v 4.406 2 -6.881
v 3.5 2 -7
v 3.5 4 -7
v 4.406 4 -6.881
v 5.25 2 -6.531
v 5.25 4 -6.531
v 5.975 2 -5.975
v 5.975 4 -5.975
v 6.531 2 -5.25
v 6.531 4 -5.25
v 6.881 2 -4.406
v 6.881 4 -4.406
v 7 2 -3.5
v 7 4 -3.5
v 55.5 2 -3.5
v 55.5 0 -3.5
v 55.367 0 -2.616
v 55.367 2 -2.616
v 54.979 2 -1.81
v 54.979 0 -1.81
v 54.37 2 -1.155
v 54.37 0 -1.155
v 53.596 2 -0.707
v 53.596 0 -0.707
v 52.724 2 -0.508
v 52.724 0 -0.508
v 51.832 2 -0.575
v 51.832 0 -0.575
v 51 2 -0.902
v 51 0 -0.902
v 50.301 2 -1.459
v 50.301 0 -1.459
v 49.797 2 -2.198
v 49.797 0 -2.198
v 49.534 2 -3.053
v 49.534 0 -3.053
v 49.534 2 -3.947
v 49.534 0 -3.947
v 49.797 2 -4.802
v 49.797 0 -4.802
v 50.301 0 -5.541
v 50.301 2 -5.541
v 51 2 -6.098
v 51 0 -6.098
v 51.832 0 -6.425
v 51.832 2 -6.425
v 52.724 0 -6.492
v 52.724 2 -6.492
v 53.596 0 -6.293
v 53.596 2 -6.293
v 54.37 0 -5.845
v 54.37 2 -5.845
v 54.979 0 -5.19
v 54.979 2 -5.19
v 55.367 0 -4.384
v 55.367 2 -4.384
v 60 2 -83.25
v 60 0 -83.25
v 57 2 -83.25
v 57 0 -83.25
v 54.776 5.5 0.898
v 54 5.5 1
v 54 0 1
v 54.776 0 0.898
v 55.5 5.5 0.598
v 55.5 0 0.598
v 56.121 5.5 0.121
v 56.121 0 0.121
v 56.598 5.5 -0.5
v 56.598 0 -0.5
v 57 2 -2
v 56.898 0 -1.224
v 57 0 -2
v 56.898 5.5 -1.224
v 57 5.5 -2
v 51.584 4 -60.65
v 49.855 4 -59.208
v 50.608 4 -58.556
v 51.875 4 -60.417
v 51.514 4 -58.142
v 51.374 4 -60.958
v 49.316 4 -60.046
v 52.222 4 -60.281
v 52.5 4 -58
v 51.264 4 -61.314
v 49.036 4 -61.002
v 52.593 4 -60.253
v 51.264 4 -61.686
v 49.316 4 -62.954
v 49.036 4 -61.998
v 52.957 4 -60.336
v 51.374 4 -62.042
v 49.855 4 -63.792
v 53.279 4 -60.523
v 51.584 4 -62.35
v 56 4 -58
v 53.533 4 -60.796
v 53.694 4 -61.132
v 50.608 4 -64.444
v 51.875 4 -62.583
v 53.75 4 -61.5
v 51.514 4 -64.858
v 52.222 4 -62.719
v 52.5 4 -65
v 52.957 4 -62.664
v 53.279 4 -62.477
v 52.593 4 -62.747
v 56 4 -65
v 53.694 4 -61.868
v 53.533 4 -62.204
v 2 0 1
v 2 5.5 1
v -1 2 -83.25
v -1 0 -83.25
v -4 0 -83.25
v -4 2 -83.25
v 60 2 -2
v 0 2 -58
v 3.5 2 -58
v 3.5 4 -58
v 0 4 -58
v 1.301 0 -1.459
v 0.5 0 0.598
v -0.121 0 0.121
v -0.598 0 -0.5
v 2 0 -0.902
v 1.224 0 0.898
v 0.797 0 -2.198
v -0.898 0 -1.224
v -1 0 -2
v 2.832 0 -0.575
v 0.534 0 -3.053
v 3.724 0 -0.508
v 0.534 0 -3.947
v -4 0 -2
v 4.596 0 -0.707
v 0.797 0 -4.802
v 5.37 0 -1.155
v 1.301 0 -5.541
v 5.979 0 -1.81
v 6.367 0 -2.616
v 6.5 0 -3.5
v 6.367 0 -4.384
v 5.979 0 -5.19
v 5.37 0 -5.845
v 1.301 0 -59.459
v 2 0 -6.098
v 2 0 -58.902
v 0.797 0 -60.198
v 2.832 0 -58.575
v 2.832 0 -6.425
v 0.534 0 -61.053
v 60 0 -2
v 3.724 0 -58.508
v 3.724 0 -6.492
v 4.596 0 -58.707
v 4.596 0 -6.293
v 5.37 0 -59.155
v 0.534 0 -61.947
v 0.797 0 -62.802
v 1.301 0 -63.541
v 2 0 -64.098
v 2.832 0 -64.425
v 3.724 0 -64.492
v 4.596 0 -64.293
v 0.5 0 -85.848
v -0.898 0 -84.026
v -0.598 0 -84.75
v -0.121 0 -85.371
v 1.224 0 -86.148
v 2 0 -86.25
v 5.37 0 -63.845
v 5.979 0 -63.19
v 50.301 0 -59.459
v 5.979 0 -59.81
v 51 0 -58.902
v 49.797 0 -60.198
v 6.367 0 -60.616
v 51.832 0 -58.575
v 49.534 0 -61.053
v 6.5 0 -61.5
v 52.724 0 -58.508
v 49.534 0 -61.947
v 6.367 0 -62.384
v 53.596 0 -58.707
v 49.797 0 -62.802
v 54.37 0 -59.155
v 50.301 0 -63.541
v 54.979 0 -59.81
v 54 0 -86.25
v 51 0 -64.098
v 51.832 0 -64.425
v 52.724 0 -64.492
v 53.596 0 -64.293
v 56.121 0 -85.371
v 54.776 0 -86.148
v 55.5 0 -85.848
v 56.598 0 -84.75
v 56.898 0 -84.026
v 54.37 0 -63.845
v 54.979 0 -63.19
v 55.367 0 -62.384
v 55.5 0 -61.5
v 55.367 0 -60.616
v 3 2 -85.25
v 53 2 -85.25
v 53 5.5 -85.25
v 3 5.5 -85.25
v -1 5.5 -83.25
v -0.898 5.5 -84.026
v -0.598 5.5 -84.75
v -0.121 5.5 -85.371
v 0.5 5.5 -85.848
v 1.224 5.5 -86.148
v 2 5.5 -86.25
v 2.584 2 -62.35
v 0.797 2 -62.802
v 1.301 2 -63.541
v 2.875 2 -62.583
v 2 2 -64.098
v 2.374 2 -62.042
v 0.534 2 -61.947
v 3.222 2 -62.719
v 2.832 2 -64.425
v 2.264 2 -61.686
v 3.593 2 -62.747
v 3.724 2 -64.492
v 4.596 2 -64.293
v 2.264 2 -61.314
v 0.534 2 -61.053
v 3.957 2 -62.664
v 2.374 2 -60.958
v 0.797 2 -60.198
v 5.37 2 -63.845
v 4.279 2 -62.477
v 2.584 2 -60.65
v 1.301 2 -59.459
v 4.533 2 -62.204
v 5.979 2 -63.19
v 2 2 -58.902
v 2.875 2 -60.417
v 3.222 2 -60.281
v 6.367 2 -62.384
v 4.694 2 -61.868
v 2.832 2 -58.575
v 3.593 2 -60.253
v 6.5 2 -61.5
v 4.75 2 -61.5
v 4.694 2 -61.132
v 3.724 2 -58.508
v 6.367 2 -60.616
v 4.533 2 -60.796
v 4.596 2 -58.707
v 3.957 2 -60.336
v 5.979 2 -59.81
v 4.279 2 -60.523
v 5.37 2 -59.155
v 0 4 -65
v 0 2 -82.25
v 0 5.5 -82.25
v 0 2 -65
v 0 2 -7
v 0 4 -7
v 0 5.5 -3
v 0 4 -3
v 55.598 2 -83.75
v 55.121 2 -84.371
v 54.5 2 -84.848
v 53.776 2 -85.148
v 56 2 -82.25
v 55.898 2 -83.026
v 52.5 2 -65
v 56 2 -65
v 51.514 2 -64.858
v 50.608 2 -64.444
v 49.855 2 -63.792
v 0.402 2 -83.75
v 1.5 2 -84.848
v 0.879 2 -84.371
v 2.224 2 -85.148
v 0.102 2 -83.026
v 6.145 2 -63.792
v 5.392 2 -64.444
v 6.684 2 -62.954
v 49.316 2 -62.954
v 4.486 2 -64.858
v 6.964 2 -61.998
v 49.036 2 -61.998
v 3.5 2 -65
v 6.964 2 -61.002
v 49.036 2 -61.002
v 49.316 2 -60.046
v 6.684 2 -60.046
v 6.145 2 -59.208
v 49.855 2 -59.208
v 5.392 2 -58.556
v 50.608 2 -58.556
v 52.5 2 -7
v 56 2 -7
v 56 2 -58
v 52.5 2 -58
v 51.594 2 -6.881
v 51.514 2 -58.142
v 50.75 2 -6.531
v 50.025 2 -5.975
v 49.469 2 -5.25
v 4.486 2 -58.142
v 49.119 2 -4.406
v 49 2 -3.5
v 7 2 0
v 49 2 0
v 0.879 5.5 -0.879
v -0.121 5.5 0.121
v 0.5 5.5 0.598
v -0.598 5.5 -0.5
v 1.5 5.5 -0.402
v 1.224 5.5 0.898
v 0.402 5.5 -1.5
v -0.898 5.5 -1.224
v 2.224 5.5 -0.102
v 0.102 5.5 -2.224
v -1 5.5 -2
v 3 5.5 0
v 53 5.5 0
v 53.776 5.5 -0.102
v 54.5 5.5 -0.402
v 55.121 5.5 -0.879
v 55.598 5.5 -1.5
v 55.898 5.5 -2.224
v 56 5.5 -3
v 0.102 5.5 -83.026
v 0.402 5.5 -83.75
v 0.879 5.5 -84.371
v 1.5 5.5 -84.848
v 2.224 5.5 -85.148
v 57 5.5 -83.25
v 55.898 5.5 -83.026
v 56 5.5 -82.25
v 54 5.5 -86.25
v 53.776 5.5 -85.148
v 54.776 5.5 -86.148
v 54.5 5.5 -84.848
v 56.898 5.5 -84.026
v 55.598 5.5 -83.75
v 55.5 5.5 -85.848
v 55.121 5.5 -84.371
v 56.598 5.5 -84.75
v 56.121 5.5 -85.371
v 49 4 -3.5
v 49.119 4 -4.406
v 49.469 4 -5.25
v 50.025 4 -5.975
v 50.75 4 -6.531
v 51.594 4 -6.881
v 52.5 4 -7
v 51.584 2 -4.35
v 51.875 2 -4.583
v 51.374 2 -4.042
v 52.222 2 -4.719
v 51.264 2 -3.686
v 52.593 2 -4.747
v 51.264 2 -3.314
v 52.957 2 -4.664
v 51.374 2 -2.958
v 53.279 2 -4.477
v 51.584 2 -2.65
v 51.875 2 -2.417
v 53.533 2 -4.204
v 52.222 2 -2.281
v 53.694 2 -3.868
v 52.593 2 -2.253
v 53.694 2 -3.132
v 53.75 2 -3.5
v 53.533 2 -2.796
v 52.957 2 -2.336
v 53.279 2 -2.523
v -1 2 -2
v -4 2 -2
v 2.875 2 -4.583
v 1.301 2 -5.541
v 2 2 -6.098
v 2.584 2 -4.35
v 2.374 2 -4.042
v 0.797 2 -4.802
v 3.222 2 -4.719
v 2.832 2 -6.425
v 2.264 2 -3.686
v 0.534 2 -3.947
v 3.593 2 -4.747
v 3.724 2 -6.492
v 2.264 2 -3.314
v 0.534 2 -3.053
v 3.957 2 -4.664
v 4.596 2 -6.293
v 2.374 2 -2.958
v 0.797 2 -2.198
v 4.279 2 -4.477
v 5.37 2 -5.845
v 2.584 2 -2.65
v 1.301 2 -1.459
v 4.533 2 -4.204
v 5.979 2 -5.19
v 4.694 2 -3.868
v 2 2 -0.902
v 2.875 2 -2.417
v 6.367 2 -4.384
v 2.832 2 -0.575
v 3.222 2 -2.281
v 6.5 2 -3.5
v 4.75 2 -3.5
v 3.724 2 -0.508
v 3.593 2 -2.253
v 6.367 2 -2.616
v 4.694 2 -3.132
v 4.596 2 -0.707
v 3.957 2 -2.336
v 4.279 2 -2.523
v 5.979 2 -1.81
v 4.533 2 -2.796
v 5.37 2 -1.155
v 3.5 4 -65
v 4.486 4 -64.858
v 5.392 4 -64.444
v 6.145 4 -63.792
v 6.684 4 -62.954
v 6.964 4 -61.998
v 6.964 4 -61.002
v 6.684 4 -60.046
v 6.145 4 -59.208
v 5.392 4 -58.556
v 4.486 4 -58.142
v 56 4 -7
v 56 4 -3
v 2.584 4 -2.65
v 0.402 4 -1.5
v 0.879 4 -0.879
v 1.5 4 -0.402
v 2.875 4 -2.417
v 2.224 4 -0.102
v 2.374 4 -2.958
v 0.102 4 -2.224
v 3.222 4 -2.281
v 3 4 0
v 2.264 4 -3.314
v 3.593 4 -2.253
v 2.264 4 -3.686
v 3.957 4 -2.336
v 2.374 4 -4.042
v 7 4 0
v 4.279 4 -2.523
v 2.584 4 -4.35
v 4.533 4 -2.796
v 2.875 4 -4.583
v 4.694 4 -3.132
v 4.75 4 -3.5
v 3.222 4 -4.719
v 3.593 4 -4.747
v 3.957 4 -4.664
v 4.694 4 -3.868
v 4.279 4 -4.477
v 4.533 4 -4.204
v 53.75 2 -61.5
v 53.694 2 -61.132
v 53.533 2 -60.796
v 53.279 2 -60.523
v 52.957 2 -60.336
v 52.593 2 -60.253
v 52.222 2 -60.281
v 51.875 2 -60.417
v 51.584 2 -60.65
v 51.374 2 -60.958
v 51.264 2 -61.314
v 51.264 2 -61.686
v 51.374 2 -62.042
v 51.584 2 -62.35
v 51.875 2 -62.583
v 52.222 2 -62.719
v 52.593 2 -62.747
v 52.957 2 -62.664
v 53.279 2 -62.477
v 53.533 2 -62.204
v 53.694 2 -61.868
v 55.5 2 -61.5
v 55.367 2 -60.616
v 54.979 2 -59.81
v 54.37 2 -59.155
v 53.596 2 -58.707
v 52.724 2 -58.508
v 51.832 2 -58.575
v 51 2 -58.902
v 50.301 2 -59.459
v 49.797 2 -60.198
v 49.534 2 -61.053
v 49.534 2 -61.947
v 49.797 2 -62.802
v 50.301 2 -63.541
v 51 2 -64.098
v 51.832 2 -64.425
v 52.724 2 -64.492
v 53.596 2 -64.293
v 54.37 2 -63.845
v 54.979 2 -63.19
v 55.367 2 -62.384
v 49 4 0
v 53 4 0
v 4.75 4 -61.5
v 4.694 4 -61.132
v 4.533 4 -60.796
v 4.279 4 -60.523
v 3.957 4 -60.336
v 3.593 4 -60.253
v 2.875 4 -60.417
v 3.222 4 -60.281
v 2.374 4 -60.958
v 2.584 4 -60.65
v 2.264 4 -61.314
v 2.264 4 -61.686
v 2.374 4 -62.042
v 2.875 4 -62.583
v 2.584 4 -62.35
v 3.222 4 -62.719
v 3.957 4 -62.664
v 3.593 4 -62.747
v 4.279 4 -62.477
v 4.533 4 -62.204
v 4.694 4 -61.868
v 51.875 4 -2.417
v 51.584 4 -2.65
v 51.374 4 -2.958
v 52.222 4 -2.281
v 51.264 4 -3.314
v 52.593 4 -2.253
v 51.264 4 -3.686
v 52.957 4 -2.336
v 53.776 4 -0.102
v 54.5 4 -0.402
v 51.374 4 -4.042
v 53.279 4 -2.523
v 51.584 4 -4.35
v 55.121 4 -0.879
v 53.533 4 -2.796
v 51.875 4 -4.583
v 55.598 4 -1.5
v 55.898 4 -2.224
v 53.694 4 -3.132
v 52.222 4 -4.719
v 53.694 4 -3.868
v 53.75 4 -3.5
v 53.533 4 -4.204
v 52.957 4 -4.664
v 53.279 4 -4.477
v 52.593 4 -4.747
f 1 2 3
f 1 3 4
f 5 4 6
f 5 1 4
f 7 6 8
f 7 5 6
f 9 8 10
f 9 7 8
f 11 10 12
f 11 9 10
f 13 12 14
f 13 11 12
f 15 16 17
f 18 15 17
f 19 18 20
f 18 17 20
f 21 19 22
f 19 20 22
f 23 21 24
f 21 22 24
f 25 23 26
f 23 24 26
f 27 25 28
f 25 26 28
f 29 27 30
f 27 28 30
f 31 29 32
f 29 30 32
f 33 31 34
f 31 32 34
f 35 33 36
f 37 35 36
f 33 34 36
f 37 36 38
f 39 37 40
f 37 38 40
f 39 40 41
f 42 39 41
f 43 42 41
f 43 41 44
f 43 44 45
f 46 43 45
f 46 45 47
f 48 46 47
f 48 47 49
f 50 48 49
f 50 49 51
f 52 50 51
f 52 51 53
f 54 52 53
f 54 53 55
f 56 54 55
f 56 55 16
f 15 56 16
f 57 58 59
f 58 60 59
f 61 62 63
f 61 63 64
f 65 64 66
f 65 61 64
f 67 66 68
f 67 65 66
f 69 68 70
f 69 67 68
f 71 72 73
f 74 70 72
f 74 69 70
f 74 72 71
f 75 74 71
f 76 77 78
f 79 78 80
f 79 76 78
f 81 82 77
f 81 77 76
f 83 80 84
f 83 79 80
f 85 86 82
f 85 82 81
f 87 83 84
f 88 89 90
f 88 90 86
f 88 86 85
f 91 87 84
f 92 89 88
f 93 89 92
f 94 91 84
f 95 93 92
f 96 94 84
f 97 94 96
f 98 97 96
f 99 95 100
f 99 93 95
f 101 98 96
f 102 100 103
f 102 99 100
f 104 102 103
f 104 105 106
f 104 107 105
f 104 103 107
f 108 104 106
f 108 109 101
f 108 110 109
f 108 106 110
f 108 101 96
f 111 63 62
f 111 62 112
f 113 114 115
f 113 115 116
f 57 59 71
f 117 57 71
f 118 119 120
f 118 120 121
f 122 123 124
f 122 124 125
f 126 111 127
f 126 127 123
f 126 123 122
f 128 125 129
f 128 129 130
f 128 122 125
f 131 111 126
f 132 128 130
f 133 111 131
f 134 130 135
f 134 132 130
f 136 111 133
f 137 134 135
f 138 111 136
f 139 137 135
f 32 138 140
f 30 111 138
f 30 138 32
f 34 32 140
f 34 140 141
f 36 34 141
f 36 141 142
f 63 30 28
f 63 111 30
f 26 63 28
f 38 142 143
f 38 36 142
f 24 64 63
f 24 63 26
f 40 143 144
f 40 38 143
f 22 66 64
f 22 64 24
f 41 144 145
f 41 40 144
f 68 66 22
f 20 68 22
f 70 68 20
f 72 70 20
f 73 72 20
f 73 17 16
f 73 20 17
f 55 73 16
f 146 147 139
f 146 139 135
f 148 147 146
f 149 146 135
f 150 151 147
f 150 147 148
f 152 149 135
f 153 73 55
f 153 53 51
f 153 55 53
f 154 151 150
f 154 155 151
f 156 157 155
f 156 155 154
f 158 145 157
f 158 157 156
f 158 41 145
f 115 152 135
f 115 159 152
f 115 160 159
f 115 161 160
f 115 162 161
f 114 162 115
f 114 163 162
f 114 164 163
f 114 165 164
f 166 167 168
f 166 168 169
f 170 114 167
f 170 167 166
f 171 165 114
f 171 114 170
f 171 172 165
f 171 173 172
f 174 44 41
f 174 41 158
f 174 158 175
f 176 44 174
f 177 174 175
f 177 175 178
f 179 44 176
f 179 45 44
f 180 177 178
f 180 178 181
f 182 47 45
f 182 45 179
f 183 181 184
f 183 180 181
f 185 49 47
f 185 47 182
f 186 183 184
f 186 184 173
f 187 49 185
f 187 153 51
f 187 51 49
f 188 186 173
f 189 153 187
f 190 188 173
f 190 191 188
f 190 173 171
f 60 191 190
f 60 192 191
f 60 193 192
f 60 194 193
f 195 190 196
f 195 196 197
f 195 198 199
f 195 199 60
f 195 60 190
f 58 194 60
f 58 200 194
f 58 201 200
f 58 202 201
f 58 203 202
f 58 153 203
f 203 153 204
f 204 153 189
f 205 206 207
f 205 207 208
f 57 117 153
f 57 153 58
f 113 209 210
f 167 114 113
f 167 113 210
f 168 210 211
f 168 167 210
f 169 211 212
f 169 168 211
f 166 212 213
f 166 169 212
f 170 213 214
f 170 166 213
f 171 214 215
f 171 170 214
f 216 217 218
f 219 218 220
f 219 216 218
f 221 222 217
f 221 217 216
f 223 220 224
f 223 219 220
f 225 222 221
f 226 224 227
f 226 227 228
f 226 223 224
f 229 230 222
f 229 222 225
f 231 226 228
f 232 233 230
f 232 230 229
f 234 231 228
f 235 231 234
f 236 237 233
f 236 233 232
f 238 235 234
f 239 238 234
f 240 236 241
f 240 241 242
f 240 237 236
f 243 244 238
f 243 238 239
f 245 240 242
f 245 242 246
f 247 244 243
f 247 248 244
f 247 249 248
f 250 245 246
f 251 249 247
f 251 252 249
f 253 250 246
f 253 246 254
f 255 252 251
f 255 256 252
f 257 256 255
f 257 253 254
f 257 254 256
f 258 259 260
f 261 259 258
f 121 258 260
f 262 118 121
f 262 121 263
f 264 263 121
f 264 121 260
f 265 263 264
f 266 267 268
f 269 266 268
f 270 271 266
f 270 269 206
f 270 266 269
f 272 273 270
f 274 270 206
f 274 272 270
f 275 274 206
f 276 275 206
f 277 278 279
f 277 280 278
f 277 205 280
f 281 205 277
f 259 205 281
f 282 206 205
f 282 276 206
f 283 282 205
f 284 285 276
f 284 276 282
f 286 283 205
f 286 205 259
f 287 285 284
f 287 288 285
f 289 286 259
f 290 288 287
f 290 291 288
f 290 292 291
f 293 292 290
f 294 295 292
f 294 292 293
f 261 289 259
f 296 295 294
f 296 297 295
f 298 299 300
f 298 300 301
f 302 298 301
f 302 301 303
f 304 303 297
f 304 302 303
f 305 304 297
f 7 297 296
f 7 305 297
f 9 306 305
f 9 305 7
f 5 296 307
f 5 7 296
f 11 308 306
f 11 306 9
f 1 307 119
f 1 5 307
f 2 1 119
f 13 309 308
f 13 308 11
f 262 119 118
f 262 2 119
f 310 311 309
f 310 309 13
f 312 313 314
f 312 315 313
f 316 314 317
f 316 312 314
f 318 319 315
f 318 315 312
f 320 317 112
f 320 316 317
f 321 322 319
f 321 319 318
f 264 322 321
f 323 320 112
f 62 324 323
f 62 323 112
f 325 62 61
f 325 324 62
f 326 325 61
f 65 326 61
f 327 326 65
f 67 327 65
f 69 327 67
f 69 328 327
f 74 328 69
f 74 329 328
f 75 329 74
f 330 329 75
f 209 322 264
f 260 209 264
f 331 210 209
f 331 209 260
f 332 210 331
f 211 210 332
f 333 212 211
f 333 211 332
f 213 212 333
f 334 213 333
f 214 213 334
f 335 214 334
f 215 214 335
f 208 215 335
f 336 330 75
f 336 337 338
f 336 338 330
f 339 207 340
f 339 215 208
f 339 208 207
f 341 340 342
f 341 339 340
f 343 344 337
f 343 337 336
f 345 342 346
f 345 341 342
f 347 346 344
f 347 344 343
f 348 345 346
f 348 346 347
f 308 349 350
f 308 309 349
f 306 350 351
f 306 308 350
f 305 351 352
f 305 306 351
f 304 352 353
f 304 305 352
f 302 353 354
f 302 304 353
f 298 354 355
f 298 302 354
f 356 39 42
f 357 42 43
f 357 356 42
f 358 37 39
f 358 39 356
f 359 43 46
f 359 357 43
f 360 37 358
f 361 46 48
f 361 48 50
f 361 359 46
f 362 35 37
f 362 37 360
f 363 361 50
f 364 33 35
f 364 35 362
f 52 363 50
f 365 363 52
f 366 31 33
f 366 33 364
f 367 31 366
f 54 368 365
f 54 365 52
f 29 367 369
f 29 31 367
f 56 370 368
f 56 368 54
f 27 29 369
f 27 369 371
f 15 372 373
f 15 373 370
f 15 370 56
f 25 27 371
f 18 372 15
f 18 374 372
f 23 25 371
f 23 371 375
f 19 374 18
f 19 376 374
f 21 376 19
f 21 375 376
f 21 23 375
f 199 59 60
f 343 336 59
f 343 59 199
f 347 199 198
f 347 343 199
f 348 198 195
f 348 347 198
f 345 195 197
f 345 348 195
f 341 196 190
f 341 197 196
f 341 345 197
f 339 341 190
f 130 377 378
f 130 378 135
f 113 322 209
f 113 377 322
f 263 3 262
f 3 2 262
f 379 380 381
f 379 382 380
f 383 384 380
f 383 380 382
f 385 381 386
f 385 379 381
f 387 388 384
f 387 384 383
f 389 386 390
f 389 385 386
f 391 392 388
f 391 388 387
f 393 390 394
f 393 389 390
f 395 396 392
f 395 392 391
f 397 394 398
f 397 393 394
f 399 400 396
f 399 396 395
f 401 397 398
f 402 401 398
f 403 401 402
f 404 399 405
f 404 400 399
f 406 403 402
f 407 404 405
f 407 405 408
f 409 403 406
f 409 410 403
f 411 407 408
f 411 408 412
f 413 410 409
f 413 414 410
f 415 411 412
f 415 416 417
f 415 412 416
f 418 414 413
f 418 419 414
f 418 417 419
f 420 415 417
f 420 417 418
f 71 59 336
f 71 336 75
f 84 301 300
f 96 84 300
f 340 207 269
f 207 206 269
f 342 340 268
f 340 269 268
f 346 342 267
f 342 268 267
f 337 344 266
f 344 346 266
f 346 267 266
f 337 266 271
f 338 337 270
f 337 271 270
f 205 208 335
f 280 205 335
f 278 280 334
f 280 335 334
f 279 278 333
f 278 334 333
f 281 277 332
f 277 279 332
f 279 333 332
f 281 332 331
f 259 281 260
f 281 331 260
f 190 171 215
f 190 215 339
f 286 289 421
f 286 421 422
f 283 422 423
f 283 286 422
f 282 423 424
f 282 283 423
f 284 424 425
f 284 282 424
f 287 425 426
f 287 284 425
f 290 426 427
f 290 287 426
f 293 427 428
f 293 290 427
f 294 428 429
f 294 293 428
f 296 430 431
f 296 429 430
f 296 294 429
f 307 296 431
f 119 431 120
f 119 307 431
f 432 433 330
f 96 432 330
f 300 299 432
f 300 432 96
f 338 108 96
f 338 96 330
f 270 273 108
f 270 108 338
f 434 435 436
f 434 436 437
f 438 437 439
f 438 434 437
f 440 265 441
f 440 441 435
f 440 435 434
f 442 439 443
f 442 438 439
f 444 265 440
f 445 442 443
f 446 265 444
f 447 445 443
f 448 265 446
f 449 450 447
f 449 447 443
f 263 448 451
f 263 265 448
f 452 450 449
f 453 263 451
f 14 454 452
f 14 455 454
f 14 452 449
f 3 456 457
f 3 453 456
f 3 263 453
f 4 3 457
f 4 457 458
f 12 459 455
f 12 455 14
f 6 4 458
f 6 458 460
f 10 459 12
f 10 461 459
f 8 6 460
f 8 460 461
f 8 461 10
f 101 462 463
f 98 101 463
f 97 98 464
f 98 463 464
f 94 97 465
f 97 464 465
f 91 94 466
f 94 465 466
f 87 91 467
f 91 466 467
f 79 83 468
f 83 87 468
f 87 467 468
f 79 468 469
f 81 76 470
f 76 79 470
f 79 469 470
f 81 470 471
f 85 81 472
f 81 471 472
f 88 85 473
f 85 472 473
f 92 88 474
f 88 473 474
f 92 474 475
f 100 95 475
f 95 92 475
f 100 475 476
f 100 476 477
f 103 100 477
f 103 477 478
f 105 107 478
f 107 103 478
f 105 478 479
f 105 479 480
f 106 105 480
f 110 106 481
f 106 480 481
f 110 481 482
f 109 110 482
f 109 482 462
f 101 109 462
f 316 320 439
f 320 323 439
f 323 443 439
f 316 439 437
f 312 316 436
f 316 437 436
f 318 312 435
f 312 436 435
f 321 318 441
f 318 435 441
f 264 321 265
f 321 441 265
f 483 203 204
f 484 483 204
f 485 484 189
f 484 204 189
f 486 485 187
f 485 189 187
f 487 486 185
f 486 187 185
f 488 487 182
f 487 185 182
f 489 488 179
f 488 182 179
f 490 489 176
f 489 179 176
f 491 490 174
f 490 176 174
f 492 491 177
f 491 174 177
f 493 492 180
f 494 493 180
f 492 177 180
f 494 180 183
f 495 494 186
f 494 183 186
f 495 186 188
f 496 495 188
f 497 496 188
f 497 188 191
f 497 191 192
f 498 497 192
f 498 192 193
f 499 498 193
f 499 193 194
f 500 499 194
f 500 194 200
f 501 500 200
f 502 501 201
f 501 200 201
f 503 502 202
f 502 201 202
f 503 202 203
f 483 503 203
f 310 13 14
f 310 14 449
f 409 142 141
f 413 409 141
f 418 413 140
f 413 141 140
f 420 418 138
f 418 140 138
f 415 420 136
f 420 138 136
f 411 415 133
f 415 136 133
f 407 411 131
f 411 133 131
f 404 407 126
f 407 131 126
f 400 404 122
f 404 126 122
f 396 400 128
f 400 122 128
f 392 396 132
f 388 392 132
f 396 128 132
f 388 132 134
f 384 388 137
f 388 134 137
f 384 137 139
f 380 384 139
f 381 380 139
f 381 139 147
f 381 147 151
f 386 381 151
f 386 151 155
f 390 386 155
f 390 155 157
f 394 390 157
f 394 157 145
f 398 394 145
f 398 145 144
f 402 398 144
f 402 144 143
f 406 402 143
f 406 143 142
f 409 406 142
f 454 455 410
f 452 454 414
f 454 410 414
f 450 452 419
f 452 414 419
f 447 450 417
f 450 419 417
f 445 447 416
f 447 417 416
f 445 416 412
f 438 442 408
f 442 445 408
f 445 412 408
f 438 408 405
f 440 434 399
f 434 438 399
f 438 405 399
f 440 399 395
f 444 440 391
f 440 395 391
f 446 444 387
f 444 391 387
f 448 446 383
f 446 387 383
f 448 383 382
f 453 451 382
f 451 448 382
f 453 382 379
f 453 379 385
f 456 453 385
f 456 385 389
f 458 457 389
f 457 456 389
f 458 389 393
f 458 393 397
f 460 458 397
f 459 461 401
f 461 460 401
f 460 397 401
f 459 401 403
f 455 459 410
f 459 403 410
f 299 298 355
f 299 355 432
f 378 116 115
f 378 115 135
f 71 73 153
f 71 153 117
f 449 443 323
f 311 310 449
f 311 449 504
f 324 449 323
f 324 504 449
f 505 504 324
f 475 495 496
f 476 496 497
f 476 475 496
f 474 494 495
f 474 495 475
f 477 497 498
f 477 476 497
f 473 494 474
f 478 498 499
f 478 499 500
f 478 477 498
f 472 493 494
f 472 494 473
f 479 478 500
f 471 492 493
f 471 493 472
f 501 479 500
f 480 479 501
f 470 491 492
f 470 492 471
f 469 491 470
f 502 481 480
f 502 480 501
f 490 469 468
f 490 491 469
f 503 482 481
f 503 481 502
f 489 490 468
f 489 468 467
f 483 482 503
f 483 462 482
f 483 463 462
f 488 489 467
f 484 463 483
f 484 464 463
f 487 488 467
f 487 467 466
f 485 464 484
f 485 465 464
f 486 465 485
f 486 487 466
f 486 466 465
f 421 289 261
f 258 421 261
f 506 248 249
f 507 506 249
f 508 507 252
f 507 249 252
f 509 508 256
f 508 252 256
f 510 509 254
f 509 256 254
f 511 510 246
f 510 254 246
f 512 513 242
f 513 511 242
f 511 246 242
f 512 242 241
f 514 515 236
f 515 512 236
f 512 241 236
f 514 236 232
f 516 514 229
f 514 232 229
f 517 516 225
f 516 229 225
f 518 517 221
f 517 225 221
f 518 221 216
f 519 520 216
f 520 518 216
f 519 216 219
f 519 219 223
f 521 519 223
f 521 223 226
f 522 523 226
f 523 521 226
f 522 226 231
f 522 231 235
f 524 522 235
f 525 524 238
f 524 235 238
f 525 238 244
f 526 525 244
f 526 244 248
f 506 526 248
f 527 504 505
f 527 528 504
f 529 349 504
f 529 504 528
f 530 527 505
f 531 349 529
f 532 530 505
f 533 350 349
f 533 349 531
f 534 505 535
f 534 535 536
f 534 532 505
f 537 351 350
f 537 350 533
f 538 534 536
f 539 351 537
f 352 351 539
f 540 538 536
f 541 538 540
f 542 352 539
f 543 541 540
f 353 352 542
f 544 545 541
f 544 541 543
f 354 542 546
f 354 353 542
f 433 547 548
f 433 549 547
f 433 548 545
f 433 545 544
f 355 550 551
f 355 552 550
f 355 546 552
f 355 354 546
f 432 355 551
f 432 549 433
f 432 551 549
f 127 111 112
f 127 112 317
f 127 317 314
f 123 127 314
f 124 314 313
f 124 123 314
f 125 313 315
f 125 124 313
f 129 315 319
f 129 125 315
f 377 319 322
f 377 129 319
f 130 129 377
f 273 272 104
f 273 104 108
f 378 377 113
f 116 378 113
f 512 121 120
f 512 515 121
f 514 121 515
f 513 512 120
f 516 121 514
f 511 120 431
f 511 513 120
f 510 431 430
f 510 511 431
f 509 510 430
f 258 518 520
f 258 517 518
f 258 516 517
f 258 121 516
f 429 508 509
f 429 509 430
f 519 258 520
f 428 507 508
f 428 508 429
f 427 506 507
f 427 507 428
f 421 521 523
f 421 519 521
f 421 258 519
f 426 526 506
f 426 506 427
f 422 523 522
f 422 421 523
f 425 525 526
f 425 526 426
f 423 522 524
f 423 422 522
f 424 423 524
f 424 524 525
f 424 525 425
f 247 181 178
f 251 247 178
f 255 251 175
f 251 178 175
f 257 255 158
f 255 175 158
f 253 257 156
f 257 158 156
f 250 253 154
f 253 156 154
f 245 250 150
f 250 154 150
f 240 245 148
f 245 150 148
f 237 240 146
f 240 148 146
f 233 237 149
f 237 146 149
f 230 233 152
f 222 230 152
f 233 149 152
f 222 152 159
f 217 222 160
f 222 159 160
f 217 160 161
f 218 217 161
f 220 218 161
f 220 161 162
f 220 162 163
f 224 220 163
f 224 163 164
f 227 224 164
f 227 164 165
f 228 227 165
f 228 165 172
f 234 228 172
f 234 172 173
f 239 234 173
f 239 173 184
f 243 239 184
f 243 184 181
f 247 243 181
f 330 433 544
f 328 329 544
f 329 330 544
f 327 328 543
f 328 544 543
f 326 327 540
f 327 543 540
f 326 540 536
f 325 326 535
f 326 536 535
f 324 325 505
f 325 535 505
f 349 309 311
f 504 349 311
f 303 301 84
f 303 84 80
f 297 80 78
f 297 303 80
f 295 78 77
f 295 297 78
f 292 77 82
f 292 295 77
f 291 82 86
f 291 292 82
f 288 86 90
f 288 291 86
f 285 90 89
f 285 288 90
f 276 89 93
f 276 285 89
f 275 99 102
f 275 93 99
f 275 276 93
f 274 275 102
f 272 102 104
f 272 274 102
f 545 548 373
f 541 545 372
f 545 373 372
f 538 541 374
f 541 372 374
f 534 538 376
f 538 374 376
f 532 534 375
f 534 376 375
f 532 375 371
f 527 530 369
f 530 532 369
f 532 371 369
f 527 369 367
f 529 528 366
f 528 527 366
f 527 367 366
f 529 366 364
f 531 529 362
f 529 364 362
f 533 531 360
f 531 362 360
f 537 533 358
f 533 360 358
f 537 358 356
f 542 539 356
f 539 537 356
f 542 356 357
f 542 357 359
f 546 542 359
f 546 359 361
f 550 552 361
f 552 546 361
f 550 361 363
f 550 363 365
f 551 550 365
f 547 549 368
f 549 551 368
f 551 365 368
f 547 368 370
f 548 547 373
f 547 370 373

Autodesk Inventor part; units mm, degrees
ref_plane "YZ Plane" through (0, 0, 0) normal (1, 0, 0) x (0, 1, 0)
ref_plane "XZ Plane" through (0, 0, 0) normal (0, 1, 0) x (-1, 0, 0)
ref_plane "XY Plane" through (0, 0, 0) normal (0, 0, 1) x (1, 0, 0)
sketch "Sketch1" plane through (0, 0, 0) normal (0, 1, 0) x (-1, 0, 0)
  line L0 (0, 0) -> (-56, 0)
  line L1 (-56, 0) -> (-56, -85.25)
  line L2 (-56, -85.25) -> (0, -85.25)
  line L3 (0, -85.25) -> (0, 0)
  dimension "d0" = 56
  dimension "d1" = 85.25
extrude "Extrusion1" add sketch "Sketch1" along normal blind 2
sketch "Sketch2" plane through (0, 2, 0) normal (0, 1, 0) x (1, 0, 0)
  line L0 (0, 85.25) -> (0, 0) projected
  line L1 (0, 0) -> (56, 0) projected
  line L2 (56, 0) -> (56, 85.25) projected
  line L3 (56, 85.25) -> (0, 85.25) projected
  line L4 (0, 85.25) -> (0, 0) projected
  line L5 (0, 0) -> (56, 0)
  line L6 (56, 0) -> (56, 85.25)
  line L7 (56, 85.25) -> (0, 85.25)
  line L8 (0, 85.25) -> (0, 0)
  line L9 (57, -1) -> (-1, -1)
  line L10 (-1, -1) -> (-1, 86.25)
  line L11 (-1, 86.25) -> (57, 86.25)
  line L12 (57, 86.25) -> (57, -1)
  dimension "d5" = 1
extrude "Extrusion2" add sketch "Sketch2" along normal blind 3.5 and the other way blind 2
fillet "Fillet1" radius 3 8 edges at (-1, 2.75, 1) (57, 2.75, 1) (57, 2.75, -86.25) (-1, 2.75, -86.25) (56, 3.75, 0) (0, 3.75, 0) (56, 3.75, -85.25) (0, 3.75, -85.25)
sketch "Sketch3" plane through (0, 2, 0) normal (0, 1, 0) x (1, 0, 0)
  line L0 (2, -1) -> (54, -1) projected
  line L1 (53, 0) -> (3, 0) projected
  line L2 (0, 3) -> (0, 82.25) projected
  line L3 (-1, 83.25) -> (-1, 2) projected
  line L4 (-1, 2) -> (-1, 83.25) projected
  arc A0 (0, 3) -> (3, 0) centre (3, 3) ccw projected
  line L5 (0, 82.25) -> (0, 3) projected
  line L6 (0, 3) -> (0, 0)
  line L7 (0, 0) -> (3, 0)
  line L8 (3, 0) -> (3.5, 0)
  line L9 (3.5, 0) -> (3.5, 3.5)
  circle A1 centre (3.5, 3.5) radius 1.25
  arc A2 (53, 0) -> (56, 3) centre (53, 3) ccw projected
  line L10 (56, 3) -> (56, 0)
  line L11 (56, 0) -> (53, 0)
  line L12 (53, 0) -> (52.5, 0)
  line L13 (52.5, 0) -> (52.5, 3.5)
  circle A3 centre (52.5, 3.5) radius 1.25
  arc A4 (3, 85.25) -> (0, 82.25) centre (3, 82.25) ccw projected
  line L14 (0, 82.25) -> (0, 85.25)
  line L15 (0, 85.25) -> (3, 85.25)
  line L16 (3, 85.25) -> (53, 85.25) projected
  circle A5 centre (3.5, 61.5) radius 1.25
  line L17 (56, 82.25) -> (56, 3) projected
  line L18 (56, 82.25) -> (56, 85.25)
  line L19 (56, 85.25) -> (56.5, 85.25)
  arc A6 (56, 82.25) -> (53, 85.25) centre (53, 82.25) ccw projected
  circle A7 centre (52.5, 61.5) radius 1.25
  dimension "d9" = 0.5
  dimension "d10" = 3.5
  dimension "d11" = 2.5
  dimension "d12" = 0.5
  dimension "d13" = 3.5
  dimension "d14" = 2.5
  dimension "d17" = 2.5
  dimension "d21" = 2.5
  dimension "d24" = 61.5
  dimension "d25" = 3.5
  dimension "d26" = 61.5
  dimension "d27" = 3.5
extrude "Extrusion3" cut sketch "Sketch3" against normal up to next contours A1 | A3 | A5 | A7
sketch "Sketch4" plane through (0, 2, 0) normal (0, 1, 0) x (1, 0, 0)
  circle A0 centre (3.5, 3.5) radius 1.25 projected
  arc A1 (0, 3) -> (3, 0) centre (3, 3) ccw projected
  arc A2 (7, 3.5) -> (3.5, 7) centre (3.5, 3.5) ccw
  line L0 (3, 0) -> (53, 0) projected
  line L1 (3.5, 7) -> (0, 7)
  line L2 (0, 82.25) -> (0, 3) projected
  line L3 (7, 3.5) -> (7, 0)
  circle A3 centre (3.5, 3.5) radius 1.25
  circle A4 centre (52.5, 3.5) radius 1.25 projected
  line L4 (56, 82.25) -> (56, 3) projected
  line L5 (53, 0) -> (3, 0) projected
  circle A5 centre (56.5, 3.5) radius 1.25
  circle A6 centre (3.5, 61.5) radius 1.25 projected
  circle A7 centre (52.5, 61.5) radius 1.25 projected
  arc A8 (3.5, 58) -> (3.5, 65) centre (3.5, 61.5) ccw
  arc A9 (52.5, 65) -> (52.5, 58) centre (52.5, 61.5) ccw
  line L6 (3.5, 65) -> (0, 65)
  line L7 (3.5, 58) -> (0, 58)
  line L8 (52.5, 65) -> (56, 65)
  line L9 (52.5, 58) -> (56, 58)
  circle A10 centre (3.5, 61.5) radius 1.25
  circle A11 centre (52.5, 61.5) radius 1.25
  circle A12 centre (3.5, 61.5) radius 1.25 projected
  circle A13 centre (3.5, 3.5) radius 1.25 projected
  circle A14 centre (52.5, 3.5) radius 1.25 projected
  circle A15 centre (52.5, 61.5) radius 1.25 projected
  arc A16 (3, 85.25) -> (0, 82.25) centre (3, 82.25) ccw projected
  line L10 (0, 82.25) -> (0, 3) projected
  arc A17 (0, 3) -> (3, 0) centre (3, 3) ccw projected
  line L11 (3, 0) -> (53, 0) projected
  arc A18 (53, 0) -> (56, 3) centre (53, 3) ccw projected
  line L12 (56, 3) -> (56, 82.25) projected
  arc A19 (56, 82.25) -> (53, 85.25) centre (53, 82.25) ccw projected
  line L13 (53, 85.25) -> (3, 85.25) projected
  arc A20 (53, 0) -> (56, 3) centre (53, 3) ccw projected
  arc A21 (52.5, 7) -> (49, 3.5) centre (52.5, 3.5) ccw
  line L14 (52.5, 7) -> (56, 7)
  line L15 (49, 3.5) -> (49, 0)
  point P0 (0, 0)
  dimension "d31" = 7
  dimension "d32" = 7
  dimension "d33" = 7
extrude "Extrusion4" add sketch "Sketch4" along normal blind 2 contours L2 L1 A2 L3 L0 A1 | L2 L6 A8 L7 | L15 A21 L14 L4 A5 A18 L0 | A5 L4 A18 | L9 A9 L8 L4 picked at (55.9186, 4.05)
sketch "Sketch5" plane through (57, 0, -83.25) normal (1, 0, 0) x (0, 0, -1)
  line L0 (-81.25, 0) -> (-81.25, 5.5) projected
  line L1 (0, 0) -> (0, 5.5) projected
  line L2 (-81.25, 0) -> (0, 0)
  line L3 (0, 0) -> (0, 2)
  line L4 (0, 2) -> (-81.25, 2)
  line L5 (-81.25, 2) -> (-81.25, 0)
  point P0 (-83.25, 0)
  dimension "d36" = 2
extrude "Extrusion5" add sketch "Sketch5" along normal blind 3
sketch "Sketch6" plane through (-1, 0, -83.25) normal (-1, 0, 0) x (0, 0, 1)
  line L0 (81.25, 2) -> (0, 2) projected
  line L1 (81.25, 0) -> (0, 0) projected
  line L2 (81.25, 5.5) -> (81.25, 0) projected
  line L3 (0, 0) -> (0, 5.5) projected
  point P0 (83.25, 0)
extrude "Extrusion6" add sketch "Sketch6" along normal blind 3
sketch "Sketch7" plane through (0, 0, 0) normal (0, -1, 0) x (1, 0, 0)
  circle A0 centre (3.5, -3.5) radius 1.25 projected
  circle A1 centre (52.5, -3.5) radius 1.25 projected
  circle A2 centre (52.5, -61.5) radius 1.25 projected
  circle A3 centre (3.5, -61.5) radius 1.25 projected
  circle A4 centre (3.5, -3.5) radius 3
  circle A5 centre (52.5, -3.5) radius 3
  circle A6 centre (52.5, -61.5) radius 3
  circle A7 centre (3.5, -61.5) radius 3
  point P0 (0, 0)
  dimension "d41" = 6
  dimension "d42" = 6
  dimension "d43" = 6
  dimension "d44" = 6
extrude "Extrusion7" cut sketch "Sketch7" against normal blind 2
properties part number "pi-holder"
